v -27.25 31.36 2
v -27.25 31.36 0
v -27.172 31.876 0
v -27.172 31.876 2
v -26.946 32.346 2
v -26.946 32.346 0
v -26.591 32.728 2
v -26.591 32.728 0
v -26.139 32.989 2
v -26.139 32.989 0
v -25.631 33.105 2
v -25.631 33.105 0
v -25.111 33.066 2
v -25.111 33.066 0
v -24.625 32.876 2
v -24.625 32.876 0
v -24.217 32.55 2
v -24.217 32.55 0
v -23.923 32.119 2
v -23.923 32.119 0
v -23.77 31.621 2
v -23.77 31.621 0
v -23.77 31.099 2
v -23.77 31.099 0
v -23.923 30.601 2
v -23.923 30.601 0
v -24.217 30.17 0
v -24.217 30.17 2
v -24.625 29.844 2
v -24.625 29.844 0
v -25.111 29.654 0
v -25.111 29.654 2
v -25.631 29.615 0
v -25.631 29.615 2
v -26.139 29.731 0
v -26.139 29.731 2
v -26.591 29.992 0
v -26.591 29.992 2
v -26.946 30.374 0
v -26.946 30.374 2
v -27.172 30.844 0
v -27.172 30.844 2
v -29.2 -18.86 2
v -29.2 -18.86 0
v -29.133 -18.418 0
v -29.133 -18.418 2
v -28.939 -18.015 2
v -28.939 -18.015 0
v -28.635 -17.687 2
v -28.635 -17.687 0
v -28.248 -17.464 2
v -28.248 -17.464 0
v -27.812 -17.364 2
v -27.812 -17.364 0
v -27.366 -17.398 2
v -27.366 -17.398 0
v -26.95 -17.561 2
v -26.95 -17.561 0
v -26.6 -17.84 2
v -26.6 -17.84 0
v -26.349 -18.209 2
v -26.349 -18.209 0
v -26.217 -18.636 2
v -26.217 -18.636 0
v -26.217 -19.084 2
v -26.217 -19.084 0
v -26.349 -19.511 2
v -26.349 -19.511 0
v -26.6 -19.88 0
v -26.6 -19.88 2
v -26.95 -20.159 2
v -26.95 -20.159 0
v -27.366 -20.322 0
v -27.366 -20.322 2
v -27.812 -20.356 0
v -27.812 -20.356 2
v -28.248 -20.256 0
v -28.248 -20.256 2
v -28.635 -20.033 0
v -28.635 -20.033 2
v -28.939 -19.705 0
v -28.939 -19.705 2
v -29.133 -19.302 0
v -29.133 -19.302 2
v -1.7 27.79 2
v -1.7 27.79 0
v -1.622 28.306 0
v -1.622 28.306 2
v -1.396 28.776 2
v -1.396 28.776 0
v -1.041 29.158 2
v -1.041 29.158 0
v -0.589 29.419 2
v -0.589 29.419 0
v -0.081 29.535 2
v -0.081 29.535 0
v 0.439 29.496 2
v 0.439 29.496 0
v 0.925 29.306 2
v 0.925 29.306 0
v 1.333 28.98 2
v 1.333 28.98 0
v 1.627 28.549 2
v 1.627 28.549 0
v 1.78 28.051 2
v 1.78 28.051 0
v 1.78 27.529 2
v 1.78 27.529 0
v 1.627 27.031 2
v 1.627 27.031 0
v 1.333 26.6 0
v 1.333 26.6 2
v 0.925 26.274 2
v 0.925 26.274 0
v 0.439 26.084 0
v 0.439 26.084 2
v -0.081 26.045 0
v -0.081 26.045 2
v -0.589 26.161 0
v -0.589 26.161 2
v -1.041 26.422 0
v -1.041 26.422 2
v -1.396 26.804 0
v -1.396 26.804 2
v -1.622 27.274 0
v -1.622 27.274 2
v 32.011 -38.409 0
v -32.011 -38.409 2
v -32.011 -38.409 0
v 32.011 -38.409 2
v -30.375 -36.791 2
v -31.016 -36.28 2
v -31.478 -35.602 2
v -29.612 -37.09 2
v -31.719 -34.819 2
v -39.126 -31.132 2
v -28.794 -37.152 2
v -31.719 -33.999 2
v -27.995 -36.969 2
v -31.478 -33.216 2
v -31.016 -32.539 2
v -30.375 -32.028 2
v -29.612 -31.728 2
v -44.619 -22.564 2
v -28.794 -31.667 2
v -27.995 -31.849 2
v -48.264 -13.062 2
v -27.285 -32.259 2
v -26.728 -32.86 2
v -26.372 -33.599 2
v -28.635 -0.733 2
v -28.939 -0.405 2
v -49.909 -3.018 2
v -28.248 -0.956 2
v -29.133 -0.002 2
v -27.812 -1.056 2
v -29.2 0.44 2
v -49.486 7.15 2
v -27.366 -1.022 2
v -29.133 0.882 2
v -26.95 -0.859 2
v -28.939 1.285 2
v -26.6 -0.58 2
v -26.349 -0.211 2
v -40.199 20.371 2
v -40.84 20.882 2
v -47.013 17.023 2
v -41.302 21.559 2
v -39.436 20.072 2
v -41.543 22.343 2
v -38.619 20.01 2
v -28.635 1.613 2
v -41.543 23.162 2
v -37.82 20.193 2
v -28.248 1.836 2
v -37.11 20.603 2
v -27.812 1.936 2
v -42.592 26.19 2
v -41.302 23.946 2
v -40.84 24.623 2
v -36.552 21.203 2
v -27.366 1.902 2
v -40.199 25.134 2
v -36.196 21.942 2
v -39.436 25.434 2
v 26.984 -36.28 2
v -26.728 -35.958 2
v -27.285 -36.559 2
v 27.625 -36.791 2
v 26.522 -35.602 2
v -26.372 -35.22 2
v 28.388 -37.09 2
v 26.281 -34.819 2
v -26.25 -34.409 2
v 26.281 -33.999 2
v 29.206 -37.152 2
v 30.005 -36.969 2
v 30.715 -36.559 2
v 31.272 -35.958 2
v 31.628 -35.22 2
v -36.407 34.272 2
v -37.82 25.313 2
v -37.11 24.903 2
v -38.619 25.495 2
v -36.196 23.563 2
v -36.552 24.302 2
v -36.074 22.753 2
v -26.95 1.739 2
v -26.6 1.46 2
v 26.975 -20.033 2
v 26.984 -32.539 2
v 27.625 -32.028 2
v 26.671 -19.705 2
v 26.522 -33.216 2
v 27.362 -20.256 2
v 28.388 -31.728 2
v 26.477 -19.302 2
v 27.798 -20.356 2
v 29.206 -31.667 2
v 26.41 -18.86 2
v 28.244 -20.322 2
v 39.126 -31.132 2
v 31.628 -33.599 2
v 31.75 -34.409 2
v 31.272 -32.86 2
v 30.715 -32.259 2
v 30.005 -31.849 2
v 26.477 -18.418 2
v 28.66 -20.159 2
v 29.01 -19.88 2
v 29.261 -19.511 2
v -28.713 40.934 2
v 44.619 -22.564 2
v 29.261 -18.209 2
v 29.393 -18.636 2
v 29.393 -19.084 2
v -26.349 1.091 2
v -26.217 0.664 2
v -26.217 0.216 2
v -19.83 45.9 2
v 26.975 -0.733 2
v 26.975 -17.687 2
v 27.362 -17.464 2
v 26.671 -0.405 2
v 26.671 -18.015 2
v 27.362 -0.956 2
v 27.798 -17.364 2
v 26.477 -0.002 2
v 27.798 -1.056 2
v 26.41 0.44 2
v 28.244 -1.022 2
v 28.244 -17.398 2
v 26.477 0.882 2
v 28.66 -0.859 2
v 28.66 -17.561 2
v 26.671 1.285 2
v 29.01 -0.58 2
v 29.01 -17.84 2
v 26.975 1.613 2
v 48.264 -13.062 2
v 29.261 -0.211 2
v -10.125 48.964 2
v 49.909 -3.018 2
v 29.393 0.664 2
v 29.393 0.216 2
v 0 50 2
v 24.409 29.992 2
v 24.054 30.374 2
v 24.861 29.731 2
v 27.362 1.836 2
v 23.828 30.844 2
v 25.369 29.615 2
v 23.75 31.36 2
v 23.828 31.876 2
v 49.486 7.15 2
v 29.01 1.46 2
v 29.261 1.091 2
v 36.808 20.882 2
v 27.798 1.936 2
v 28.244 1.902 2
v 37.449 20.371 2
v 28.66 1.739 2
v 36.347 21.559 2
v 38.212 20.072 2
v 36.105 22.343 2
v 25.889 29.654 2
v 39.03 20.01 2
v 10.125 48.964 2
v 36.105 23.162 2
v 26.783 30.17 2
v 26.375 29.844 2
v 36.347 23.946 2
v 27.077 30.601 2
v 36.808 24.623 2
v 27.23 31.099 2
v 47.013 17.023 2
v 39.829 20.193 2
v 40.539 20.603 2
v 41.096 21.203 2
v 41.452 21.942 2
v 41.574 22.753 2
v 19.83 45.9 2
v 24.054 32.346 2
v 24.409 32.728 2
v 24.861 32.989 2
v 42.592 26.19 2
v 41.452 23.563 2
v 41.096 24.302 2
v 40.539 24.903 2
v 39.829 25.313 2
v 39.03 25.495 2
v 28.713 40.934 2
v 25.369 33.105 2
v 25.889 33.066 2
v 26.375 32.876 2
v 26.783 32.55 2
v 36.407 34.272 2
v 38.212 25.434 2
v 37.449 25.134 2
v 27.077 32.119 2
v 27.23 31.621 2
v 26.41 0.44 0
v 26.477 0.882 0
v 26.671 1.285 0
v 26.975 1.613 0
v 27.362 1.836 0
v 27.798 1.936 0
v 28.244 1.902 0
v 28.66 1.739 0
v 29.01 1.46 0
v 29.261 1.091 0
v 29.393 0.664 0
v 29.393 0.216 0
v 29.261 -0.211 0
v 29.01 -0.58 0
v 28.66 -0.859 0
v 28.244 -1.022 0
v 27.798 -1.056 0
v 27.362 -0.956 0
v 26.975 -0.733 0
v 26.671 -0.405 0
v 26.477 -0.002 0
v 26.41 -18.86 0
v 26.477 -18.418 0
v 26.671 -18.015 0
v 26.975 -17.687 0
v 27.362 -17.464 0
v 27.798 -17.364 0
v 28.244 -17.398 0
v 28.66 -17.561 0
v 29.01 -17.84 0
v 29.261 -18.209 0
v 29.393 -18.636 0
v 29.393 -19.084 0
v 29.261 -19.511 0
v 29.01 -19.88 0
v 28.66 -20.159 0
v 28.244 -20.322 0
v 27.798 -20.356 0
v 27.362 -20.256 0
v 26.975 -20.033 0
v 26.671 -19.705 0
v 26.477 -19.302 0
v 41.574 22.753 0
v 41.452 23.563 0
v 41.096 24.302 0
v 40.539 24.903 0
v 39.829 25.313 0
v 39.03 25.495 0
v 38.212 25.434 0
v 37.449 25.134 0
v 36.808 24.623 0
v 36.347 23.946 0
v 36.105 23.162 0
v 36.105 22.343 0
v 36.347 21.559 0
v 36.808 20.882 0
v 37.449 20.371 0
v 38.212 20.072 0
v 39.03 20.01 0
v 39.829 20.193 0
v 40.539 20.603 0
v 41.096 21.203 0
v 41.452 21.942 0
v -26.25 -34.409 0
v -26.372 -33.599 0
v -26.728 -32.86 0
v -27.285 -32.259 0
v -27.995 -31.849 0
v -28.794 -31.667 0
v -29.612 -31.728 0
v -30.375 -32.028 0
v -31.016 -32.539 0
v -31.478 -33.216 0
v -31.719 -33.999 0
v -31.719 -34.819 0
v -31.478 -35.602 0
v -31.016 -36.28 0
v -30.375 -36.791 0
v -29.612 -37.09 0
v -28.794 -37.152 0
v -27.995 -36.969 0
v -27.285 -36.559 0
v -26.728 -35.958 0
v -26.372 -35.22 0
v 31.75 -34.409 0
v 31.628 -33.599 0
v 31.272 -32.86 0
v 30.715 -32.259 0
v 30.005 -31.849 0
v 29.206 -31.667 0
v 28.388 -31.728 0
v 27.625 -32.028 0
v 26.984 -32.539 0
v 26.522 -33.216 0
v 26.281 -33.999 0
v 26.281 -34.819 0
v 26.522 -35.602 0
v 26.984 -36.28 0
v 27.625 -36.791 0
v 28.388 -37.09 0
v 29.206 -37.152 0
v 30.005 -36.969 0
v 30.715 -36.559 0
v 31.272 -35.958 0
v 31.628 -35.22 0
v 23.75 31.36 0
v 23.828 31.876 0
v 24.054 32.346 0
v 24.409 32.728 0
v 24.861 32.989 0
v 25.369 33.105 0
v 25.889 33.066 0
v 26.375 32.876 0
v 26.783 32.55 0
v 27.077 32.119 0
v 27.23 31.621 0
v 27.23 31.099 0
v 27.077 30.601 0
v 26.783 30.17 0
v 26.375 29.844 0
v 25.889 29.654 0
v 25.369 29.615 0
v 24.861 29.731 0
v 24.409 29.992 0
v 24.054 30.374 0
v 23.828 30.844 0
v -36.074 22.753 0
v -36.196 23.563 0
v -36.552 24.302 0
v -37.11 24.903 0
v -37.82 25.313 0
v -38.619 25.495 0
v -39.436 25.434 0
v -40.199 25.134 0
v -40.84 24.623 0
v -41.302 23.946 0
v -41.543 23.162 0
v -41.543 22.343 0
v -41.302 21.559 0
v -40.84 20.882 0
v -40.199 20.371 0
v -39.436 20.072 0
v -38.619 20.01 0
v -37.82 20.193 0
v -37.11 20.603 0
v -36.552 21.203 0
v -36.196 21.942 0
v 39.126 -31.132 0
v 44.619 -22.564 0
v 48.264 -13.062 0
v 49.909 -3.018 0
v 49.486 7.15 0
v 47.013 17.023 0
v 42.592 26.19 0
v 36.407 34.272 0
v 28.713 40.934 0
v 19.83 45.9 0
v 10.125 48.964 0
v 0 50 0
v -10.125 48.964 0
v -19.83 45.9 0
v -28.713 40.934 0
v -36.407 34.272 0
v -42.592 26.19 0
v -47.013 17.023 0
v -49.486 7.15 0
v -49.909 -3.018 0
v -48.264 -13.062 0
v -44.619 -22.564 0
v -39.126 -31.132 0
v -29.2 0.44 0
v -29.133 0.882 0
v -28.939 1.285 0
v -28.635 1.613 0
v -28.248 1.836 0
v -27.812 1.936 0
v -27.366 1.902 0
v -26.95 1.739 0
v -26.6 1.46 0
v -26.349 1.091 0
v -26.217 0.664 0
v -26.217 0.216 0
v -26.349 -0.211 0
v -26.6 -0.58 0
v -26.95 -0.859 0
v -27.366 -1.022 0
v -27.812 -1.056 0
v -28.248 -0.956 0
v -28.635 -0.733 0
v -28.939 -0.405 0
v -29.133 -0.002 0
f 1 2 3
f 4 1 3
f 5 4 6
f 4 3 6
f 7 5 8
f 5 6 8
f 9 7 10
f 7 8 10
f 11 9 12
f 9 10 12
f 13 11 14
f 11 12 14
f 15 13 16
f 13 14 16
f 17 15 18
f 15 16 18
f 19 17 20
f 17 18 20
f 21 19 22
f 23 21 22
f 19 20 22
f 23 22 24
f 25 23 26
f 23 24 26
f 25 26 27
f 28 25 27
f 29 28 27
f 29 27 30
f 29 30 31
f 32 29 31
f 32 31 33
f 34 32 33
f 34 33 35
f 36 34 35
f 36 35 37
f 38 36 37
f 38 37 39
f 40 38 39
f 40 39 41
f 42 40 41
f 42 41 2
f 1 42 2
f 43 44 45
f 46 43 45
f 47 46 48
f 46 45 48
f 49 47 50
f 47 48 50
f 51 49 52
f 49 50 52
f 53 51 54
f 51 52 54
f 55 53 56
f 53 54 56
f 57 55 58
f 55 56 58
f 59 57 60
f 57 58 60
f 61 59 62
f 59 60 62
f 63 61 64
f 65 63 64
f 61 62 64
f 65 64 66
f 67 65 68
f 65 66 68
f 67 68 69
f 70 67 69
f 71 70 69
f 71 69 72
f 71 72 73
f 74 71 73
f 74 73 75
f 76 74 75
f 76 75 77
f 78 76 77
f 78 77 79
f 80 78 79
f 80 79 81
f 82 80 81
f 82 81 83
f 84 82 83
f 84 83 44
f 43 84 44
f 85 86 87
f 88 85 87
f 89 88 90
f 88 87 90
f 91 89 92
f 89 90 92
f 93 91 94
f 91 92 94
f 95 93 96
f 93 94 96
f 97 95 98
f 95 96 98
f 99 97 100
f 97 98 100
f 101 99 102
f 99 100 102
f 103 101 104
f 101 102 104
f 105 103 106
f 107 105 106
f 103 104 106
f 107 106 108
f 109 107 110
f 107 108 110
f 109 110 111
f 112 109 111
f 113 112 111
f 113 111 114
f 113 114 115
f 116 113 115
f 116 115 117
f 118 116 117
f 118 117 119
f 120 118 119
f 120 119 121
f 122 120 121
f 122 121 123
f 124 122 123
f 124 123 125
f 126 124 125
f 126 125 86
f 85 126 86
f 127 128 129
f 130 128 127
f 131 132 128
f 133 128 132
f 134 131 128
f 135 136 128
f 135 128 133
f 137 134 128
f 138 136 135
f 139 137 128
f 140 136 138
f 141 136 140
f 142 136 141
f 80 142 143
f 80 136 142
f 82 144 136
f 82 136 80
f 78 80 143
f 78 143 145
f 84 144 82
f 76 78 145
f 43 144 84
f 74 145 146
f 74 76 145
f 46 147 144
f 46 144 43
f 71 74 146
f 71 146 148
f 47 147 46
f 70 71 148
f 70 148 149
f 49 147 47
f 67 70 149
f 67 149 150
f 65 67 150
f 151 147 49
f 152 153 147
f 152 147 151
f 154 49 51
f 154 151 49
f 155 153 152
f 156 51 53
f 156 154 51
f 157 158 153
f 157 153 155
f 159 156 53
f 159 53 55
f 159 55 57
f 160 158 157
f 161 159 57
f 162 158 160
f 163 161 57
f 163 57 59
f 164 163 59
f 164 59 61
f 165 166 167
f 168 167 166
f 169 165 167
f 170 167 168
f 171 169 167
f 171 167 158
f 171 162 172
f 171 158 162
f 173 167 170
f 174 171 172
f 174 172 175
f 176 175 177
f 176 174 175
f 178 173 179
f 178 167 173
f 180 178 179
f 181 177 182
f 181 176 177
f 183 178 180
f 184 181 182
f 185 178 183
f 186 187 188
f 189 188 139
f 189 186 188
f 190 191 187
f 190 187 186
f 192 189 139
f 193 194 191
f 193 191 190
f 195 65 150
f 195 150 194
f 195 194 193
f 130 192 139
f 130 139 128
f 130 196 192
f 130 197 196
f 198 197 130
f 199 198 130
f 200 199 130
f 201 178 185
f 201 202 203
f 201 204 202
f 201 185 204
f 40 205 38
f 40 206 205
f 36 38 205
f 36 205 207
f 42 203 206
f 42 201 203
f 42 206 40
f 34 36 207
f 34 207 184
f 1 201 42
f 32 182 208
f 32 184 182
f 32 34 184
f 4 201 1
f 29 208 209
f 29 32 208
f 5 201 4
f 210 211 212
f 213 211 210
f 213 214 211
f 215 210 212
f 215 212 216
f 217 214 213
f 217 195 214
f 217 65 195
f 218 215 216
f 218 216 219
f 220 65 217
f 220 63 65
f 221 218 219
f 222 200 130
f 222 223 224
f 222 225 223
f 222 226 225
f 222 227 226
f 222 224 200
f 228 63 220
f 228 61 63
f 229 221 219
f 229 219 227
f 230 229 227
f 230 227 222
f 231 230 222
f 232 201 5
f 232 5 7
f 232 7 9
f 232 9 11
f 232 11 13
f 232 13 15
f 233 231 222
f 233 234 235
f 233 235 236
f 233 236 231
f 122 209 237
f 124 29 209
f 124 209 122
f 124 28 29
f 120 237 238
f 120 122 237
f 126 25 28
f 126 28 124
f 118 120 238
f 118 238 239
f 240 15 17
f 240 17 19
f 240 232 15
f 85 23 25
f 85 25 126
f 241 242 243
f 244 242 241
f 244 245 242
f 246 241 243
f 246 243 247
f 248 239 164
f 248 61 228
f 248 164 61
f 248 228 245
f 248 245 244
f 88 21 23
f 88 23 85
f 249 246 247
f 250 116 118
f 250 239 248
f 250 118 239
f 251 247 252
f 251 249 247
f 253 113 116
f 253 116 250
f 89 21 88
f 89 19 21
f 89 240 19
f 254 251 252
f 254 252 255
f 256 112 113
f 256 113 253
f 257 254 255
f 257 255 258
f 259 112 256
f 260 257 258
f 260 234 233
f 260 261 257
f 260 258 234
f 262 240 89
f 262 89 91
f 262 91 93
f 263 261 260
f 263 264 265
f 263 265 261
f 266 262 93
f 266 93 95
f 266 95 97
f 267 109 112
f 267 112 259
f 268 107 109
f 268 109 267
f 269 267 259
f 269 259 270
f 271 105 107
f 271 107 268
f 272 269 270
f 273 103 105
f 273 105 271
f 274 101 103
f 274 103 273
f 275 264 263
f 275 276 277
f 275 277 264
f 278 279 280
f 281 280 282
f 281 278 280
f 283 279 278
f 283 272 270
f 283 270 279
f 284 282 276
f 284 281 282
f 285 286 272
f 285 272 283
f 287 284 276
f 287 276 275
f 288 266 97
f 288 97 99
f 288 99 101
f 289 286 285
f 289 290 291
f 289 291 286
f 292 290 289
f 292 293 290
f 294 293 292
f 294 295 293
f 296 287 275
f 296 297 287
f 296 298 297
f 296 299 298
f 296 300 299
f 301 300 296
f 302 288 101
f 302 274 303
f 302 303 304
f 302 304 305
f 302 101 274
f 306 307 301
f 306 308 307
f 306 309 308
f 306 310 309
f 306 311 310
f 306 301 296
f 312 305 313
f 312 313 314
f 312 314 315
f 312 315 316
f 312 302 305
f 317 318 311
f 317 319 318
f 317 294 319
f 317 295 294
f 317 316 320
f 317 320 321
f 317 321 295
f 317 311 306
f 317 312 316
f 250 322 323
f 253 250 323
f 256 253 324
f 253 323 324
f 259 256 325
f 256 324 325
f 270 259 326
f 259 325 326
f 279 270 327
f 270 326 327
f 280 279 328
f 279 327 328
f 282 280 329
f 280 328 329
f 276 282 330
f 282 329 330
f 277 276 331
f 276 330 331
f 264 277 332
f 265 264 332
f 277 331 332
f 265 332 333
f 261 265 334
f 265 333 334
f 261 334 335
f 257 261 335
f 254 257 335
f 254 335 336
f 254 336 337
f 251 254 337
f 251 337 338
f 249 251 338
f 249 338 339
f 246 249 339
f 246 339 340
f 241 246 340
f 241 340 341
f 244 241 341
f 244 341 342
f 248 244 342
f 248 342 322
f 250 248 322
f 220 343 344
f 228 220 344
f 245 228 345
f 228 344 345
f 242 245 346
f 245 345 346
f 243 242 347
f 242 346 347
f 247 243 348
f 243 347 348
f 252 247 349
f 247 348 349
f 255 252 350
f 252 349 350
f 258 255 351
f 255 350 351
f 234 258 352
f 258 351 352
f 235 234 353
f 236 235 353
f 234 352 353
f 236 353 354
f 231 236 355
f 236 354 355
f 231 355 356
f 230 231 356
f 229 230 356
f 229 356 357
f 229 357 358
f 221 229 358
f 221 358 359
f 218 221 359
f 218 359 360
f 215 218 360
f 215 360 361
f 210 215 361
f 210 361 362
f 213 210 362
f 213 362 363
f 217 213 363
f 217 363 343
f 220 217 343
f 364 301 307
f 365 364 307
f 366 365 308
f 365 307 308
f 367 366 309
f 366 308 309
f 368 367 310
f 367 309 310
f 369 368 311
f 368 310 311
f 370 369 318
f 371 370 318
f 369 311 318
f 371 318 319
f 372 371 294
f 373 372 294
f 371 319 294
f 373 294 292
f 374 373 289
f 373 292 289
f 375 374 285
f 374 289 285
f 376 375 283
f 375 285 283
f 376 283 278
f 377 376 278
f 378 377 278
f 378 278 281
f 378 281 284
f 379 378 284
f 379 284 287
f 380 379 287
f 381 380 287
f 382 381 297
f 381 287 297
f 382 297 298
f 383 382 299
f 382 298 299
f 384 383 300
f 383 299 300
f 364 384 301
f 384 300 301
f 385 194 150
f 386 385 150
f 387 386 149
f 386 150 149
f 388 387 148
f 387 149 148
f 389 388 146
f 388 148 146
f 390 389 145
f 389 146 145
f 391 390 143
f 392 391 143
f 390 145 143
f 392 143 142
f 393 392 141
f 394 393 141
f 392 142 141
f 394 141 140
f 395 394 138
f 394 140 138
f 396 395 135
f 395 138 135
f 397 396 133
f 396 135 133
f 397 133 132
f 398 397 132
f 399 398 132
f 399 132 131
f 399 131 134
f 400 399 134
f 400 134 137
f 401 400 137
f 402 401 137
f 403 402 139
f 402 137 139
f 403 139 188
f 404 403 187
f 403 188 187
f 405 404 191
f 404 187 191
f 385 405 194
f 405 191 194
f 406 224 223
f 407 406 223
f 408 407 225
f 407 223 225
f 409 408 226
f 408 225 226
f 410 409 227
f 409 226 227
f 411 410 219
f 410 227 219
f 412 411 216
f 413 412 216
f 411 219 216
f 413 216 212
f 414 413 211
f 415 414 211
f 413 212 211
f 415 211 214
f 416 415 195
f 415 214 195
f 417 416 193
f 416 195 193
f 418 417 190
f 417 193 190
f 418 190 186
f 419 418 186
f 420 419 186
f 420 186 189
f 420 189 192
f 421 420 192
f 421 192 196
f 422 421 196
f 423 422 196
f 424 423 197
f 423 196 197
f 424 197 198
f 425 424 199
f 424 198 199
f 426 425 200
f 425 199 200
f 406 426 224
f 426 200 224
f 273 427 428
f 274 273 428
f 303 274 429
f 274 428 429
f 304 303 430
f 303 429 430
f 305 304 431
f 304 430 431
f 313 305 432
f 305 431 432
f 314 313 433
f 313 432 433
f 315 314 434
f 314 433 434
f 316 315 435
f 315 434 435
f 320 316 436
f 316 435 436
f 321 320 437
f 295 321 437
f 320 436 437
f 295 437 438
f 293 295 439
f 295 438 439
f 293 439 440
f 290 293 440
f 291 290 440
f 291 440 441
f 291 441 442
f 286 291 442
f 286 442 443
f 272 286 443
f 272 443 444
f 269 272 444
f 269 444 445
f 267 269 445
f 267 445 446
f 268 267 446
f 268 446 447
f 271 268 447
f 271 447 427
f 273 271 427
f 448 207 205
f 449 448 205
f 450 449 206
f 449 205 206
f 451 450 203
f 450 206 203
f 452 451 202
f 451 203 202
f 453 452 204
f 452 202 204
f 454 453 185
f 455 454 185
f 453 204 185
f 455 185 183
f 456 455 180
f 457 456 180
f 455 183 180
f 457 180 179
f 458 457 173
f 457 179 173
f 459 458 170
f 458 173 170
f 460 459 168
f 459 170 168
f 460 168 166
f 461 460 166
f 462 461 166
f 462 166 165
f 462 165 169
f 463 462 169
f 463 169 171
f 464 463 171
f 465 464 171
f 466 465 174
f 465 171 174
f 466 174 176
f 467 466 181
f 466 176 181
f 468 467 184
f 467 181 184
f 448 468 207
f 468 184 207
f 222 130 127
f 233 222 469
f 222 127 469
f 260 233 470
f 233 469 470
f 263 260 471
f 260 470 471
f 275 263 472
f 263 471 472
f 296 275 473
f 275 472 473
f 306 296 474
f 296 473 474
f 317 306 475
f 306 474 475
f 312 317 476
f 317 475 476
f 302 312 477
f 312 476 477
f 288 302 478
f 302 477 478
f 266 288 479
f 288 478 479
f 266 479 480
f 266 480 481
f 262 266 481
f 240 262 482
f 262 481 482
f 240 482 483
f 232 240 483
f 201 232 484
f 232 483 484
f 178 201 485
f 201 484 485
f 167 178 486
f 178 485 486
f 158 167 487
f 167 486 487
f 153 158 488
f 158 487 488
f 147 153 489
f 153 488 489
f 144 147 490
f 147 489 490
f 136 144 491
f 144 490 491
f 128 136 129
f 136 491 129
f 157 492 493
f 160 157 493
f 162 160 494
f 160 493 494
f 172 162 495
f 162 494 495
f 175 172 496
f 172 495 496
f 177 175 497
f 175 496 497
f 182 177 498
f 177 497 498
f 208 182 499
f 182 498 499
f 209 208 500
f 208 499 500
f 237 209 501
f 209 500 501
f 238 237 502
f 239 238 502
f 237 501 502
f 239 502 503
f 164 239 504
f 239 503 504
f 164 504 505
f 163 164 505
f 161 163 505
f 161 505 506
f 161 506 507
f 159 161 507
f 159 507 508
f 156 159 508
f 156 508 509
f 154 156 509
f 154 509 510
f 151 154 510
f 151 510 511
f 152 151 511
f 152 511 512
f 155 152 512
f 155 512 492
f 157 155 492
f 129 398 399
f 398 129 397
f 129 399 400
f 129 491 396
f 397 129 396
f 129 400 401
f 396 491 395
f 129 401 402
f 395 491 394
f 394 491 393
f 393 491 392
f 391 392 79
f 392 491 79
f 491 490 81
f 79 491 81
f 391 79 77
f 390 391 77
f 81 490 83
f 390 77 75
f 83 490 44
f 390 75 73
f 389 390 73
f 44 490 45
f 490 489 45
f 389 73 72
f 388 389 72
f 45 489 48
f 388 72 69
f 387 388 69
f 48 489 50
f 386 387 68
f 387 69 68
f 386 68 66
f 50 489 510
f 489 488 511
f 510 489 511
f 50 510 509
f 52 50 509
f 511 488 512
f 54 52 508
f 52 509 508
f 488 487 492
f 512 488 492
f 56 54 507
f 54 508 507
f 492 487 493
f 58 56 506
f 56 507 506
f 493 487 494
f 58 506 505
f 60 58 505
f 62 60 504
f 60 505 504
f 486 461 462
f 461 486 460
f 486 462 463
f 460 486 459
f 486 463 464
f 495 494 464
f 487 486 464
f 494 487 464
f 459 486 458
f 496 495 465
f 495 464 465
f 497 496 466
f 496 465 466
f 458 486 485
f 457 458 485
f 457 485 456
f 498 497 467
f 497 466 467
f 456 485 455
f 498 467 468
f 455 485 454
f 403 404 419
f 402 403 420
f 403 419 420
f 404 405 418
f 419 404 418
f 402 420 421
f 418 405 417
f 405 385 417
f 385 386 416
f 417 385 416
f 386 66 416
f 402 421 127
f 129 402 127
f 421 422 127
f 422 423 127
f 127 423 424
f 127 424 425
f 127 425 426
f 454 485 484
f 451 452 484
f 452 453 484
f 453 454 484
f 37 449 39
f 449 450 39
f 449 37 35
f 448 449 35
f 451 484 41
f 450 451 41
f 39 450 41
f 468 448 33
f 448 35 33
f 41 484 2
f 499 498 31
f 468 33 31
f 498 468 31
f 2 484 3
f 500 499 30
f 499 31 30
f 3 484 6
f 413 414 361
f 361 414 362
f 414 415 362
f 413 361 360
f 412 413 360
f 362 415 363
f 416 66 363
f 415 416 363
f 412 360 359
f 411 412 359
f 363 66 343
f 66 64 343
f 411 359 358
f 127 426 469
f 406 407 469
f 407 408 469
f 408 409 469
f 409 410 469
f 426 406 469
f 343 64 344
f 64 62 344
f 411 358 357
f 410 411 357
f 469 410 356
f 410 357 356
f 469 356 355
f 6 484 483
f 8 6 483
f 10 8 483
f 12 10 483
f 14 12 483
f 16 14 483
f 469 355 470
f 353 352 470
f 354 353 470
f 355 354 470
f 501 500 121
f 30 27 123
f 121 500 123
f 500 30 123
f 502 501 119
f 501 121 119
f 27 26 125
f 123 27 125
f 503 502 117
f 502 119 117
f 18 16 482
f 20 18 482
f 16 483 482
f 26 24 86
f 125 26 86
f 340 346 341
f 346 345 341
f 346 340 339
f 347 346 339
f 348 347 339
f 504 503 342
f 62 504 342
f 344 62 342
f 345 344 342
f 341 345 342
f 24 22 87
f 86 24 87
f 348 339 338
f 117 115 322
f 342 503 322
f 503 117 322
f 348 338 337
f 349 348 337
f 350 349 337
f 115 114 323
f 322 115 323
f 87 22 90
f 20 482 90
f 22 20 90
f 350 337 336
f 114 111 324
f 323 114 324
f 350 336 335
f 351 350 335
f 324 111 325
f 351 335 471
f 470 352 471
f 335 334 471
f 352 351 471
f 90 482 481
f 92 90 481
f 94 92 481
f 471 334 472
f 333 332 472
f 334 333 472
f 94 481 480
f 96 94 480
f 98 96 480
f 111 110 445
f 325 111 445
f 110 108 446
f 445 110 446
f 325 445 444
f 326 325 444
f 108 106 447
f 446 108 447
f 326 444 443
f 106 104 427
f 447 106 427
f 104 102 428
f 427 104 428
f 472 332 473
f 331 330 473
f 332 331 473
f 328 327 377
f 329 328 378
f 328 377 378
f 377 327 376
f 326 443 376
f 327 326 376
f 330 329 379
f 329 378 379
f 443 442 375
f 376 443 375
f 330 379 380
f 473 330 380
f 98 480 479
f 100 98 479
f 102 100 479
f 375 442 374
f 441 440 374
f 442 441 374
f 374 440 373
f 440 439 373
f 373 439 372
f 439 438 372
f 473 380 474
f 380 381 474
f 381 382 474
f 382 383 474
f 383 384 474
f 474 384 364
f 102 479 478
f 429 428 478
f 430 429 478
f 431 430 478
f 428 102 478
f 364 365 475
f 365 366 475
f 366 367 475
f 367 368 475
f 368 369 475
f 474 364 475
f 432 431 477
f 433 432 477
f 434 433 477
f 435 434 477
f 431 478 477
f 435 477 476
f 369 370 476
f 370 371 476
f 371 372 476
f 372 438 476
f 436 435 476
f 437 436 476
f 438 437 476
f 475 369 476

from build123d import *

# Parameters (mm, degrees)
ESBO_O1_R                  = 50
RESSALTO_EXTRUS_O1_DEPTH   = 2
ESBO_O2_R                  = 2.75
CORTE_EXTRUS_O1_DEPTH      = 2
CORTE_EXTRUS_O2_DEPTH      = 1
CORTE_EXTRUS_O2_DEPTH_BACK = 10
ESBO_O5_R                  = 1.5
ESBO_O5_R_2                = 1.75
CORTE_EXTRUS_O3_DEPTH      = 10


with BuildPart() as part:
    # Esboço1 → Ressalto-extrusão1 (new body)
    with BuildSketch(Plane.XY):
        Circle(ESBO_O1_R)
    extrude(amount=RESSALTO_EXTRUS_O1_DEPTH)

    # Esboço2 → Corte-extrusão1 (cut)
    with BuildSketch(Plane.XY.offset(2)):
        with Locations((-29, -34.409301068)):
            Circle(ESBO_O2_R)
        with Locations((29, -34.409301068)):
            Circle(ESBO_O2_R)
        with Locations((-38.824197531, 22.752619324)):
            Circle(ESBO_O2_R)
        with Locations((38.824197531, 22.752619324)):
            Circle(ESBO_O2_R)
    extrude(amount=-CORTE_EXTRUS_O1_DEPTH, mode=Mode.SUBTRACT)

    # Esboço4 → Corte-extrusão2 (cut, two sides)
    with BuildSketch(Plane.XY.offset(2)) as corte_extrus_o2_sk:
        Polygon((-40.723859979, -38.409301068), (44.57073926, -38.409301068), (1.923439641, -68.002213614), align=None)
    extrude(amount=CORTE_EXTRUS_O2_DEPTH, mode=Mode.SUBTRACT)
    extrude(corte_extrus_o2_sk.sketch, amount=-CORTE_EXTRUS_O2_DEPTH_BACK, mode=Mode.SUBTRACT)

    # Esboço5 → Corte-extrusão3 (cut)
    with BuildSketch(Plane(origin=(0, 0, 0), x_dir=(-1, 0, 0), z_dir=(0, 0, -1))):
        with Locations((-27.91, -18.86)):
            Circle(ESBO_O5_R)
        with Locations((27.7, -18.86)):
            Circle(ESBO_O5_R)
        with Locations((27.7, 0.44)):
            Circle(ESBO_O5_R)
        with Locations((-27.91, 0.44)):
            Circle(ESBO_O5_R)
        with Locations((25.5, 31.36)):
            Circle(ESBO_O5_R_2)
        with Locations((-0.05, 27.79)):
            Circle(ESBO_O5_R_2)
        with Locations((-25.5, 31.36)):
            Circle(ESBO_O5_R_2)
    extrude(amount=-CORTE_EXTRUS_O3_DEPTH, mode=Mode.SUBTRACT)


solid = part.part
